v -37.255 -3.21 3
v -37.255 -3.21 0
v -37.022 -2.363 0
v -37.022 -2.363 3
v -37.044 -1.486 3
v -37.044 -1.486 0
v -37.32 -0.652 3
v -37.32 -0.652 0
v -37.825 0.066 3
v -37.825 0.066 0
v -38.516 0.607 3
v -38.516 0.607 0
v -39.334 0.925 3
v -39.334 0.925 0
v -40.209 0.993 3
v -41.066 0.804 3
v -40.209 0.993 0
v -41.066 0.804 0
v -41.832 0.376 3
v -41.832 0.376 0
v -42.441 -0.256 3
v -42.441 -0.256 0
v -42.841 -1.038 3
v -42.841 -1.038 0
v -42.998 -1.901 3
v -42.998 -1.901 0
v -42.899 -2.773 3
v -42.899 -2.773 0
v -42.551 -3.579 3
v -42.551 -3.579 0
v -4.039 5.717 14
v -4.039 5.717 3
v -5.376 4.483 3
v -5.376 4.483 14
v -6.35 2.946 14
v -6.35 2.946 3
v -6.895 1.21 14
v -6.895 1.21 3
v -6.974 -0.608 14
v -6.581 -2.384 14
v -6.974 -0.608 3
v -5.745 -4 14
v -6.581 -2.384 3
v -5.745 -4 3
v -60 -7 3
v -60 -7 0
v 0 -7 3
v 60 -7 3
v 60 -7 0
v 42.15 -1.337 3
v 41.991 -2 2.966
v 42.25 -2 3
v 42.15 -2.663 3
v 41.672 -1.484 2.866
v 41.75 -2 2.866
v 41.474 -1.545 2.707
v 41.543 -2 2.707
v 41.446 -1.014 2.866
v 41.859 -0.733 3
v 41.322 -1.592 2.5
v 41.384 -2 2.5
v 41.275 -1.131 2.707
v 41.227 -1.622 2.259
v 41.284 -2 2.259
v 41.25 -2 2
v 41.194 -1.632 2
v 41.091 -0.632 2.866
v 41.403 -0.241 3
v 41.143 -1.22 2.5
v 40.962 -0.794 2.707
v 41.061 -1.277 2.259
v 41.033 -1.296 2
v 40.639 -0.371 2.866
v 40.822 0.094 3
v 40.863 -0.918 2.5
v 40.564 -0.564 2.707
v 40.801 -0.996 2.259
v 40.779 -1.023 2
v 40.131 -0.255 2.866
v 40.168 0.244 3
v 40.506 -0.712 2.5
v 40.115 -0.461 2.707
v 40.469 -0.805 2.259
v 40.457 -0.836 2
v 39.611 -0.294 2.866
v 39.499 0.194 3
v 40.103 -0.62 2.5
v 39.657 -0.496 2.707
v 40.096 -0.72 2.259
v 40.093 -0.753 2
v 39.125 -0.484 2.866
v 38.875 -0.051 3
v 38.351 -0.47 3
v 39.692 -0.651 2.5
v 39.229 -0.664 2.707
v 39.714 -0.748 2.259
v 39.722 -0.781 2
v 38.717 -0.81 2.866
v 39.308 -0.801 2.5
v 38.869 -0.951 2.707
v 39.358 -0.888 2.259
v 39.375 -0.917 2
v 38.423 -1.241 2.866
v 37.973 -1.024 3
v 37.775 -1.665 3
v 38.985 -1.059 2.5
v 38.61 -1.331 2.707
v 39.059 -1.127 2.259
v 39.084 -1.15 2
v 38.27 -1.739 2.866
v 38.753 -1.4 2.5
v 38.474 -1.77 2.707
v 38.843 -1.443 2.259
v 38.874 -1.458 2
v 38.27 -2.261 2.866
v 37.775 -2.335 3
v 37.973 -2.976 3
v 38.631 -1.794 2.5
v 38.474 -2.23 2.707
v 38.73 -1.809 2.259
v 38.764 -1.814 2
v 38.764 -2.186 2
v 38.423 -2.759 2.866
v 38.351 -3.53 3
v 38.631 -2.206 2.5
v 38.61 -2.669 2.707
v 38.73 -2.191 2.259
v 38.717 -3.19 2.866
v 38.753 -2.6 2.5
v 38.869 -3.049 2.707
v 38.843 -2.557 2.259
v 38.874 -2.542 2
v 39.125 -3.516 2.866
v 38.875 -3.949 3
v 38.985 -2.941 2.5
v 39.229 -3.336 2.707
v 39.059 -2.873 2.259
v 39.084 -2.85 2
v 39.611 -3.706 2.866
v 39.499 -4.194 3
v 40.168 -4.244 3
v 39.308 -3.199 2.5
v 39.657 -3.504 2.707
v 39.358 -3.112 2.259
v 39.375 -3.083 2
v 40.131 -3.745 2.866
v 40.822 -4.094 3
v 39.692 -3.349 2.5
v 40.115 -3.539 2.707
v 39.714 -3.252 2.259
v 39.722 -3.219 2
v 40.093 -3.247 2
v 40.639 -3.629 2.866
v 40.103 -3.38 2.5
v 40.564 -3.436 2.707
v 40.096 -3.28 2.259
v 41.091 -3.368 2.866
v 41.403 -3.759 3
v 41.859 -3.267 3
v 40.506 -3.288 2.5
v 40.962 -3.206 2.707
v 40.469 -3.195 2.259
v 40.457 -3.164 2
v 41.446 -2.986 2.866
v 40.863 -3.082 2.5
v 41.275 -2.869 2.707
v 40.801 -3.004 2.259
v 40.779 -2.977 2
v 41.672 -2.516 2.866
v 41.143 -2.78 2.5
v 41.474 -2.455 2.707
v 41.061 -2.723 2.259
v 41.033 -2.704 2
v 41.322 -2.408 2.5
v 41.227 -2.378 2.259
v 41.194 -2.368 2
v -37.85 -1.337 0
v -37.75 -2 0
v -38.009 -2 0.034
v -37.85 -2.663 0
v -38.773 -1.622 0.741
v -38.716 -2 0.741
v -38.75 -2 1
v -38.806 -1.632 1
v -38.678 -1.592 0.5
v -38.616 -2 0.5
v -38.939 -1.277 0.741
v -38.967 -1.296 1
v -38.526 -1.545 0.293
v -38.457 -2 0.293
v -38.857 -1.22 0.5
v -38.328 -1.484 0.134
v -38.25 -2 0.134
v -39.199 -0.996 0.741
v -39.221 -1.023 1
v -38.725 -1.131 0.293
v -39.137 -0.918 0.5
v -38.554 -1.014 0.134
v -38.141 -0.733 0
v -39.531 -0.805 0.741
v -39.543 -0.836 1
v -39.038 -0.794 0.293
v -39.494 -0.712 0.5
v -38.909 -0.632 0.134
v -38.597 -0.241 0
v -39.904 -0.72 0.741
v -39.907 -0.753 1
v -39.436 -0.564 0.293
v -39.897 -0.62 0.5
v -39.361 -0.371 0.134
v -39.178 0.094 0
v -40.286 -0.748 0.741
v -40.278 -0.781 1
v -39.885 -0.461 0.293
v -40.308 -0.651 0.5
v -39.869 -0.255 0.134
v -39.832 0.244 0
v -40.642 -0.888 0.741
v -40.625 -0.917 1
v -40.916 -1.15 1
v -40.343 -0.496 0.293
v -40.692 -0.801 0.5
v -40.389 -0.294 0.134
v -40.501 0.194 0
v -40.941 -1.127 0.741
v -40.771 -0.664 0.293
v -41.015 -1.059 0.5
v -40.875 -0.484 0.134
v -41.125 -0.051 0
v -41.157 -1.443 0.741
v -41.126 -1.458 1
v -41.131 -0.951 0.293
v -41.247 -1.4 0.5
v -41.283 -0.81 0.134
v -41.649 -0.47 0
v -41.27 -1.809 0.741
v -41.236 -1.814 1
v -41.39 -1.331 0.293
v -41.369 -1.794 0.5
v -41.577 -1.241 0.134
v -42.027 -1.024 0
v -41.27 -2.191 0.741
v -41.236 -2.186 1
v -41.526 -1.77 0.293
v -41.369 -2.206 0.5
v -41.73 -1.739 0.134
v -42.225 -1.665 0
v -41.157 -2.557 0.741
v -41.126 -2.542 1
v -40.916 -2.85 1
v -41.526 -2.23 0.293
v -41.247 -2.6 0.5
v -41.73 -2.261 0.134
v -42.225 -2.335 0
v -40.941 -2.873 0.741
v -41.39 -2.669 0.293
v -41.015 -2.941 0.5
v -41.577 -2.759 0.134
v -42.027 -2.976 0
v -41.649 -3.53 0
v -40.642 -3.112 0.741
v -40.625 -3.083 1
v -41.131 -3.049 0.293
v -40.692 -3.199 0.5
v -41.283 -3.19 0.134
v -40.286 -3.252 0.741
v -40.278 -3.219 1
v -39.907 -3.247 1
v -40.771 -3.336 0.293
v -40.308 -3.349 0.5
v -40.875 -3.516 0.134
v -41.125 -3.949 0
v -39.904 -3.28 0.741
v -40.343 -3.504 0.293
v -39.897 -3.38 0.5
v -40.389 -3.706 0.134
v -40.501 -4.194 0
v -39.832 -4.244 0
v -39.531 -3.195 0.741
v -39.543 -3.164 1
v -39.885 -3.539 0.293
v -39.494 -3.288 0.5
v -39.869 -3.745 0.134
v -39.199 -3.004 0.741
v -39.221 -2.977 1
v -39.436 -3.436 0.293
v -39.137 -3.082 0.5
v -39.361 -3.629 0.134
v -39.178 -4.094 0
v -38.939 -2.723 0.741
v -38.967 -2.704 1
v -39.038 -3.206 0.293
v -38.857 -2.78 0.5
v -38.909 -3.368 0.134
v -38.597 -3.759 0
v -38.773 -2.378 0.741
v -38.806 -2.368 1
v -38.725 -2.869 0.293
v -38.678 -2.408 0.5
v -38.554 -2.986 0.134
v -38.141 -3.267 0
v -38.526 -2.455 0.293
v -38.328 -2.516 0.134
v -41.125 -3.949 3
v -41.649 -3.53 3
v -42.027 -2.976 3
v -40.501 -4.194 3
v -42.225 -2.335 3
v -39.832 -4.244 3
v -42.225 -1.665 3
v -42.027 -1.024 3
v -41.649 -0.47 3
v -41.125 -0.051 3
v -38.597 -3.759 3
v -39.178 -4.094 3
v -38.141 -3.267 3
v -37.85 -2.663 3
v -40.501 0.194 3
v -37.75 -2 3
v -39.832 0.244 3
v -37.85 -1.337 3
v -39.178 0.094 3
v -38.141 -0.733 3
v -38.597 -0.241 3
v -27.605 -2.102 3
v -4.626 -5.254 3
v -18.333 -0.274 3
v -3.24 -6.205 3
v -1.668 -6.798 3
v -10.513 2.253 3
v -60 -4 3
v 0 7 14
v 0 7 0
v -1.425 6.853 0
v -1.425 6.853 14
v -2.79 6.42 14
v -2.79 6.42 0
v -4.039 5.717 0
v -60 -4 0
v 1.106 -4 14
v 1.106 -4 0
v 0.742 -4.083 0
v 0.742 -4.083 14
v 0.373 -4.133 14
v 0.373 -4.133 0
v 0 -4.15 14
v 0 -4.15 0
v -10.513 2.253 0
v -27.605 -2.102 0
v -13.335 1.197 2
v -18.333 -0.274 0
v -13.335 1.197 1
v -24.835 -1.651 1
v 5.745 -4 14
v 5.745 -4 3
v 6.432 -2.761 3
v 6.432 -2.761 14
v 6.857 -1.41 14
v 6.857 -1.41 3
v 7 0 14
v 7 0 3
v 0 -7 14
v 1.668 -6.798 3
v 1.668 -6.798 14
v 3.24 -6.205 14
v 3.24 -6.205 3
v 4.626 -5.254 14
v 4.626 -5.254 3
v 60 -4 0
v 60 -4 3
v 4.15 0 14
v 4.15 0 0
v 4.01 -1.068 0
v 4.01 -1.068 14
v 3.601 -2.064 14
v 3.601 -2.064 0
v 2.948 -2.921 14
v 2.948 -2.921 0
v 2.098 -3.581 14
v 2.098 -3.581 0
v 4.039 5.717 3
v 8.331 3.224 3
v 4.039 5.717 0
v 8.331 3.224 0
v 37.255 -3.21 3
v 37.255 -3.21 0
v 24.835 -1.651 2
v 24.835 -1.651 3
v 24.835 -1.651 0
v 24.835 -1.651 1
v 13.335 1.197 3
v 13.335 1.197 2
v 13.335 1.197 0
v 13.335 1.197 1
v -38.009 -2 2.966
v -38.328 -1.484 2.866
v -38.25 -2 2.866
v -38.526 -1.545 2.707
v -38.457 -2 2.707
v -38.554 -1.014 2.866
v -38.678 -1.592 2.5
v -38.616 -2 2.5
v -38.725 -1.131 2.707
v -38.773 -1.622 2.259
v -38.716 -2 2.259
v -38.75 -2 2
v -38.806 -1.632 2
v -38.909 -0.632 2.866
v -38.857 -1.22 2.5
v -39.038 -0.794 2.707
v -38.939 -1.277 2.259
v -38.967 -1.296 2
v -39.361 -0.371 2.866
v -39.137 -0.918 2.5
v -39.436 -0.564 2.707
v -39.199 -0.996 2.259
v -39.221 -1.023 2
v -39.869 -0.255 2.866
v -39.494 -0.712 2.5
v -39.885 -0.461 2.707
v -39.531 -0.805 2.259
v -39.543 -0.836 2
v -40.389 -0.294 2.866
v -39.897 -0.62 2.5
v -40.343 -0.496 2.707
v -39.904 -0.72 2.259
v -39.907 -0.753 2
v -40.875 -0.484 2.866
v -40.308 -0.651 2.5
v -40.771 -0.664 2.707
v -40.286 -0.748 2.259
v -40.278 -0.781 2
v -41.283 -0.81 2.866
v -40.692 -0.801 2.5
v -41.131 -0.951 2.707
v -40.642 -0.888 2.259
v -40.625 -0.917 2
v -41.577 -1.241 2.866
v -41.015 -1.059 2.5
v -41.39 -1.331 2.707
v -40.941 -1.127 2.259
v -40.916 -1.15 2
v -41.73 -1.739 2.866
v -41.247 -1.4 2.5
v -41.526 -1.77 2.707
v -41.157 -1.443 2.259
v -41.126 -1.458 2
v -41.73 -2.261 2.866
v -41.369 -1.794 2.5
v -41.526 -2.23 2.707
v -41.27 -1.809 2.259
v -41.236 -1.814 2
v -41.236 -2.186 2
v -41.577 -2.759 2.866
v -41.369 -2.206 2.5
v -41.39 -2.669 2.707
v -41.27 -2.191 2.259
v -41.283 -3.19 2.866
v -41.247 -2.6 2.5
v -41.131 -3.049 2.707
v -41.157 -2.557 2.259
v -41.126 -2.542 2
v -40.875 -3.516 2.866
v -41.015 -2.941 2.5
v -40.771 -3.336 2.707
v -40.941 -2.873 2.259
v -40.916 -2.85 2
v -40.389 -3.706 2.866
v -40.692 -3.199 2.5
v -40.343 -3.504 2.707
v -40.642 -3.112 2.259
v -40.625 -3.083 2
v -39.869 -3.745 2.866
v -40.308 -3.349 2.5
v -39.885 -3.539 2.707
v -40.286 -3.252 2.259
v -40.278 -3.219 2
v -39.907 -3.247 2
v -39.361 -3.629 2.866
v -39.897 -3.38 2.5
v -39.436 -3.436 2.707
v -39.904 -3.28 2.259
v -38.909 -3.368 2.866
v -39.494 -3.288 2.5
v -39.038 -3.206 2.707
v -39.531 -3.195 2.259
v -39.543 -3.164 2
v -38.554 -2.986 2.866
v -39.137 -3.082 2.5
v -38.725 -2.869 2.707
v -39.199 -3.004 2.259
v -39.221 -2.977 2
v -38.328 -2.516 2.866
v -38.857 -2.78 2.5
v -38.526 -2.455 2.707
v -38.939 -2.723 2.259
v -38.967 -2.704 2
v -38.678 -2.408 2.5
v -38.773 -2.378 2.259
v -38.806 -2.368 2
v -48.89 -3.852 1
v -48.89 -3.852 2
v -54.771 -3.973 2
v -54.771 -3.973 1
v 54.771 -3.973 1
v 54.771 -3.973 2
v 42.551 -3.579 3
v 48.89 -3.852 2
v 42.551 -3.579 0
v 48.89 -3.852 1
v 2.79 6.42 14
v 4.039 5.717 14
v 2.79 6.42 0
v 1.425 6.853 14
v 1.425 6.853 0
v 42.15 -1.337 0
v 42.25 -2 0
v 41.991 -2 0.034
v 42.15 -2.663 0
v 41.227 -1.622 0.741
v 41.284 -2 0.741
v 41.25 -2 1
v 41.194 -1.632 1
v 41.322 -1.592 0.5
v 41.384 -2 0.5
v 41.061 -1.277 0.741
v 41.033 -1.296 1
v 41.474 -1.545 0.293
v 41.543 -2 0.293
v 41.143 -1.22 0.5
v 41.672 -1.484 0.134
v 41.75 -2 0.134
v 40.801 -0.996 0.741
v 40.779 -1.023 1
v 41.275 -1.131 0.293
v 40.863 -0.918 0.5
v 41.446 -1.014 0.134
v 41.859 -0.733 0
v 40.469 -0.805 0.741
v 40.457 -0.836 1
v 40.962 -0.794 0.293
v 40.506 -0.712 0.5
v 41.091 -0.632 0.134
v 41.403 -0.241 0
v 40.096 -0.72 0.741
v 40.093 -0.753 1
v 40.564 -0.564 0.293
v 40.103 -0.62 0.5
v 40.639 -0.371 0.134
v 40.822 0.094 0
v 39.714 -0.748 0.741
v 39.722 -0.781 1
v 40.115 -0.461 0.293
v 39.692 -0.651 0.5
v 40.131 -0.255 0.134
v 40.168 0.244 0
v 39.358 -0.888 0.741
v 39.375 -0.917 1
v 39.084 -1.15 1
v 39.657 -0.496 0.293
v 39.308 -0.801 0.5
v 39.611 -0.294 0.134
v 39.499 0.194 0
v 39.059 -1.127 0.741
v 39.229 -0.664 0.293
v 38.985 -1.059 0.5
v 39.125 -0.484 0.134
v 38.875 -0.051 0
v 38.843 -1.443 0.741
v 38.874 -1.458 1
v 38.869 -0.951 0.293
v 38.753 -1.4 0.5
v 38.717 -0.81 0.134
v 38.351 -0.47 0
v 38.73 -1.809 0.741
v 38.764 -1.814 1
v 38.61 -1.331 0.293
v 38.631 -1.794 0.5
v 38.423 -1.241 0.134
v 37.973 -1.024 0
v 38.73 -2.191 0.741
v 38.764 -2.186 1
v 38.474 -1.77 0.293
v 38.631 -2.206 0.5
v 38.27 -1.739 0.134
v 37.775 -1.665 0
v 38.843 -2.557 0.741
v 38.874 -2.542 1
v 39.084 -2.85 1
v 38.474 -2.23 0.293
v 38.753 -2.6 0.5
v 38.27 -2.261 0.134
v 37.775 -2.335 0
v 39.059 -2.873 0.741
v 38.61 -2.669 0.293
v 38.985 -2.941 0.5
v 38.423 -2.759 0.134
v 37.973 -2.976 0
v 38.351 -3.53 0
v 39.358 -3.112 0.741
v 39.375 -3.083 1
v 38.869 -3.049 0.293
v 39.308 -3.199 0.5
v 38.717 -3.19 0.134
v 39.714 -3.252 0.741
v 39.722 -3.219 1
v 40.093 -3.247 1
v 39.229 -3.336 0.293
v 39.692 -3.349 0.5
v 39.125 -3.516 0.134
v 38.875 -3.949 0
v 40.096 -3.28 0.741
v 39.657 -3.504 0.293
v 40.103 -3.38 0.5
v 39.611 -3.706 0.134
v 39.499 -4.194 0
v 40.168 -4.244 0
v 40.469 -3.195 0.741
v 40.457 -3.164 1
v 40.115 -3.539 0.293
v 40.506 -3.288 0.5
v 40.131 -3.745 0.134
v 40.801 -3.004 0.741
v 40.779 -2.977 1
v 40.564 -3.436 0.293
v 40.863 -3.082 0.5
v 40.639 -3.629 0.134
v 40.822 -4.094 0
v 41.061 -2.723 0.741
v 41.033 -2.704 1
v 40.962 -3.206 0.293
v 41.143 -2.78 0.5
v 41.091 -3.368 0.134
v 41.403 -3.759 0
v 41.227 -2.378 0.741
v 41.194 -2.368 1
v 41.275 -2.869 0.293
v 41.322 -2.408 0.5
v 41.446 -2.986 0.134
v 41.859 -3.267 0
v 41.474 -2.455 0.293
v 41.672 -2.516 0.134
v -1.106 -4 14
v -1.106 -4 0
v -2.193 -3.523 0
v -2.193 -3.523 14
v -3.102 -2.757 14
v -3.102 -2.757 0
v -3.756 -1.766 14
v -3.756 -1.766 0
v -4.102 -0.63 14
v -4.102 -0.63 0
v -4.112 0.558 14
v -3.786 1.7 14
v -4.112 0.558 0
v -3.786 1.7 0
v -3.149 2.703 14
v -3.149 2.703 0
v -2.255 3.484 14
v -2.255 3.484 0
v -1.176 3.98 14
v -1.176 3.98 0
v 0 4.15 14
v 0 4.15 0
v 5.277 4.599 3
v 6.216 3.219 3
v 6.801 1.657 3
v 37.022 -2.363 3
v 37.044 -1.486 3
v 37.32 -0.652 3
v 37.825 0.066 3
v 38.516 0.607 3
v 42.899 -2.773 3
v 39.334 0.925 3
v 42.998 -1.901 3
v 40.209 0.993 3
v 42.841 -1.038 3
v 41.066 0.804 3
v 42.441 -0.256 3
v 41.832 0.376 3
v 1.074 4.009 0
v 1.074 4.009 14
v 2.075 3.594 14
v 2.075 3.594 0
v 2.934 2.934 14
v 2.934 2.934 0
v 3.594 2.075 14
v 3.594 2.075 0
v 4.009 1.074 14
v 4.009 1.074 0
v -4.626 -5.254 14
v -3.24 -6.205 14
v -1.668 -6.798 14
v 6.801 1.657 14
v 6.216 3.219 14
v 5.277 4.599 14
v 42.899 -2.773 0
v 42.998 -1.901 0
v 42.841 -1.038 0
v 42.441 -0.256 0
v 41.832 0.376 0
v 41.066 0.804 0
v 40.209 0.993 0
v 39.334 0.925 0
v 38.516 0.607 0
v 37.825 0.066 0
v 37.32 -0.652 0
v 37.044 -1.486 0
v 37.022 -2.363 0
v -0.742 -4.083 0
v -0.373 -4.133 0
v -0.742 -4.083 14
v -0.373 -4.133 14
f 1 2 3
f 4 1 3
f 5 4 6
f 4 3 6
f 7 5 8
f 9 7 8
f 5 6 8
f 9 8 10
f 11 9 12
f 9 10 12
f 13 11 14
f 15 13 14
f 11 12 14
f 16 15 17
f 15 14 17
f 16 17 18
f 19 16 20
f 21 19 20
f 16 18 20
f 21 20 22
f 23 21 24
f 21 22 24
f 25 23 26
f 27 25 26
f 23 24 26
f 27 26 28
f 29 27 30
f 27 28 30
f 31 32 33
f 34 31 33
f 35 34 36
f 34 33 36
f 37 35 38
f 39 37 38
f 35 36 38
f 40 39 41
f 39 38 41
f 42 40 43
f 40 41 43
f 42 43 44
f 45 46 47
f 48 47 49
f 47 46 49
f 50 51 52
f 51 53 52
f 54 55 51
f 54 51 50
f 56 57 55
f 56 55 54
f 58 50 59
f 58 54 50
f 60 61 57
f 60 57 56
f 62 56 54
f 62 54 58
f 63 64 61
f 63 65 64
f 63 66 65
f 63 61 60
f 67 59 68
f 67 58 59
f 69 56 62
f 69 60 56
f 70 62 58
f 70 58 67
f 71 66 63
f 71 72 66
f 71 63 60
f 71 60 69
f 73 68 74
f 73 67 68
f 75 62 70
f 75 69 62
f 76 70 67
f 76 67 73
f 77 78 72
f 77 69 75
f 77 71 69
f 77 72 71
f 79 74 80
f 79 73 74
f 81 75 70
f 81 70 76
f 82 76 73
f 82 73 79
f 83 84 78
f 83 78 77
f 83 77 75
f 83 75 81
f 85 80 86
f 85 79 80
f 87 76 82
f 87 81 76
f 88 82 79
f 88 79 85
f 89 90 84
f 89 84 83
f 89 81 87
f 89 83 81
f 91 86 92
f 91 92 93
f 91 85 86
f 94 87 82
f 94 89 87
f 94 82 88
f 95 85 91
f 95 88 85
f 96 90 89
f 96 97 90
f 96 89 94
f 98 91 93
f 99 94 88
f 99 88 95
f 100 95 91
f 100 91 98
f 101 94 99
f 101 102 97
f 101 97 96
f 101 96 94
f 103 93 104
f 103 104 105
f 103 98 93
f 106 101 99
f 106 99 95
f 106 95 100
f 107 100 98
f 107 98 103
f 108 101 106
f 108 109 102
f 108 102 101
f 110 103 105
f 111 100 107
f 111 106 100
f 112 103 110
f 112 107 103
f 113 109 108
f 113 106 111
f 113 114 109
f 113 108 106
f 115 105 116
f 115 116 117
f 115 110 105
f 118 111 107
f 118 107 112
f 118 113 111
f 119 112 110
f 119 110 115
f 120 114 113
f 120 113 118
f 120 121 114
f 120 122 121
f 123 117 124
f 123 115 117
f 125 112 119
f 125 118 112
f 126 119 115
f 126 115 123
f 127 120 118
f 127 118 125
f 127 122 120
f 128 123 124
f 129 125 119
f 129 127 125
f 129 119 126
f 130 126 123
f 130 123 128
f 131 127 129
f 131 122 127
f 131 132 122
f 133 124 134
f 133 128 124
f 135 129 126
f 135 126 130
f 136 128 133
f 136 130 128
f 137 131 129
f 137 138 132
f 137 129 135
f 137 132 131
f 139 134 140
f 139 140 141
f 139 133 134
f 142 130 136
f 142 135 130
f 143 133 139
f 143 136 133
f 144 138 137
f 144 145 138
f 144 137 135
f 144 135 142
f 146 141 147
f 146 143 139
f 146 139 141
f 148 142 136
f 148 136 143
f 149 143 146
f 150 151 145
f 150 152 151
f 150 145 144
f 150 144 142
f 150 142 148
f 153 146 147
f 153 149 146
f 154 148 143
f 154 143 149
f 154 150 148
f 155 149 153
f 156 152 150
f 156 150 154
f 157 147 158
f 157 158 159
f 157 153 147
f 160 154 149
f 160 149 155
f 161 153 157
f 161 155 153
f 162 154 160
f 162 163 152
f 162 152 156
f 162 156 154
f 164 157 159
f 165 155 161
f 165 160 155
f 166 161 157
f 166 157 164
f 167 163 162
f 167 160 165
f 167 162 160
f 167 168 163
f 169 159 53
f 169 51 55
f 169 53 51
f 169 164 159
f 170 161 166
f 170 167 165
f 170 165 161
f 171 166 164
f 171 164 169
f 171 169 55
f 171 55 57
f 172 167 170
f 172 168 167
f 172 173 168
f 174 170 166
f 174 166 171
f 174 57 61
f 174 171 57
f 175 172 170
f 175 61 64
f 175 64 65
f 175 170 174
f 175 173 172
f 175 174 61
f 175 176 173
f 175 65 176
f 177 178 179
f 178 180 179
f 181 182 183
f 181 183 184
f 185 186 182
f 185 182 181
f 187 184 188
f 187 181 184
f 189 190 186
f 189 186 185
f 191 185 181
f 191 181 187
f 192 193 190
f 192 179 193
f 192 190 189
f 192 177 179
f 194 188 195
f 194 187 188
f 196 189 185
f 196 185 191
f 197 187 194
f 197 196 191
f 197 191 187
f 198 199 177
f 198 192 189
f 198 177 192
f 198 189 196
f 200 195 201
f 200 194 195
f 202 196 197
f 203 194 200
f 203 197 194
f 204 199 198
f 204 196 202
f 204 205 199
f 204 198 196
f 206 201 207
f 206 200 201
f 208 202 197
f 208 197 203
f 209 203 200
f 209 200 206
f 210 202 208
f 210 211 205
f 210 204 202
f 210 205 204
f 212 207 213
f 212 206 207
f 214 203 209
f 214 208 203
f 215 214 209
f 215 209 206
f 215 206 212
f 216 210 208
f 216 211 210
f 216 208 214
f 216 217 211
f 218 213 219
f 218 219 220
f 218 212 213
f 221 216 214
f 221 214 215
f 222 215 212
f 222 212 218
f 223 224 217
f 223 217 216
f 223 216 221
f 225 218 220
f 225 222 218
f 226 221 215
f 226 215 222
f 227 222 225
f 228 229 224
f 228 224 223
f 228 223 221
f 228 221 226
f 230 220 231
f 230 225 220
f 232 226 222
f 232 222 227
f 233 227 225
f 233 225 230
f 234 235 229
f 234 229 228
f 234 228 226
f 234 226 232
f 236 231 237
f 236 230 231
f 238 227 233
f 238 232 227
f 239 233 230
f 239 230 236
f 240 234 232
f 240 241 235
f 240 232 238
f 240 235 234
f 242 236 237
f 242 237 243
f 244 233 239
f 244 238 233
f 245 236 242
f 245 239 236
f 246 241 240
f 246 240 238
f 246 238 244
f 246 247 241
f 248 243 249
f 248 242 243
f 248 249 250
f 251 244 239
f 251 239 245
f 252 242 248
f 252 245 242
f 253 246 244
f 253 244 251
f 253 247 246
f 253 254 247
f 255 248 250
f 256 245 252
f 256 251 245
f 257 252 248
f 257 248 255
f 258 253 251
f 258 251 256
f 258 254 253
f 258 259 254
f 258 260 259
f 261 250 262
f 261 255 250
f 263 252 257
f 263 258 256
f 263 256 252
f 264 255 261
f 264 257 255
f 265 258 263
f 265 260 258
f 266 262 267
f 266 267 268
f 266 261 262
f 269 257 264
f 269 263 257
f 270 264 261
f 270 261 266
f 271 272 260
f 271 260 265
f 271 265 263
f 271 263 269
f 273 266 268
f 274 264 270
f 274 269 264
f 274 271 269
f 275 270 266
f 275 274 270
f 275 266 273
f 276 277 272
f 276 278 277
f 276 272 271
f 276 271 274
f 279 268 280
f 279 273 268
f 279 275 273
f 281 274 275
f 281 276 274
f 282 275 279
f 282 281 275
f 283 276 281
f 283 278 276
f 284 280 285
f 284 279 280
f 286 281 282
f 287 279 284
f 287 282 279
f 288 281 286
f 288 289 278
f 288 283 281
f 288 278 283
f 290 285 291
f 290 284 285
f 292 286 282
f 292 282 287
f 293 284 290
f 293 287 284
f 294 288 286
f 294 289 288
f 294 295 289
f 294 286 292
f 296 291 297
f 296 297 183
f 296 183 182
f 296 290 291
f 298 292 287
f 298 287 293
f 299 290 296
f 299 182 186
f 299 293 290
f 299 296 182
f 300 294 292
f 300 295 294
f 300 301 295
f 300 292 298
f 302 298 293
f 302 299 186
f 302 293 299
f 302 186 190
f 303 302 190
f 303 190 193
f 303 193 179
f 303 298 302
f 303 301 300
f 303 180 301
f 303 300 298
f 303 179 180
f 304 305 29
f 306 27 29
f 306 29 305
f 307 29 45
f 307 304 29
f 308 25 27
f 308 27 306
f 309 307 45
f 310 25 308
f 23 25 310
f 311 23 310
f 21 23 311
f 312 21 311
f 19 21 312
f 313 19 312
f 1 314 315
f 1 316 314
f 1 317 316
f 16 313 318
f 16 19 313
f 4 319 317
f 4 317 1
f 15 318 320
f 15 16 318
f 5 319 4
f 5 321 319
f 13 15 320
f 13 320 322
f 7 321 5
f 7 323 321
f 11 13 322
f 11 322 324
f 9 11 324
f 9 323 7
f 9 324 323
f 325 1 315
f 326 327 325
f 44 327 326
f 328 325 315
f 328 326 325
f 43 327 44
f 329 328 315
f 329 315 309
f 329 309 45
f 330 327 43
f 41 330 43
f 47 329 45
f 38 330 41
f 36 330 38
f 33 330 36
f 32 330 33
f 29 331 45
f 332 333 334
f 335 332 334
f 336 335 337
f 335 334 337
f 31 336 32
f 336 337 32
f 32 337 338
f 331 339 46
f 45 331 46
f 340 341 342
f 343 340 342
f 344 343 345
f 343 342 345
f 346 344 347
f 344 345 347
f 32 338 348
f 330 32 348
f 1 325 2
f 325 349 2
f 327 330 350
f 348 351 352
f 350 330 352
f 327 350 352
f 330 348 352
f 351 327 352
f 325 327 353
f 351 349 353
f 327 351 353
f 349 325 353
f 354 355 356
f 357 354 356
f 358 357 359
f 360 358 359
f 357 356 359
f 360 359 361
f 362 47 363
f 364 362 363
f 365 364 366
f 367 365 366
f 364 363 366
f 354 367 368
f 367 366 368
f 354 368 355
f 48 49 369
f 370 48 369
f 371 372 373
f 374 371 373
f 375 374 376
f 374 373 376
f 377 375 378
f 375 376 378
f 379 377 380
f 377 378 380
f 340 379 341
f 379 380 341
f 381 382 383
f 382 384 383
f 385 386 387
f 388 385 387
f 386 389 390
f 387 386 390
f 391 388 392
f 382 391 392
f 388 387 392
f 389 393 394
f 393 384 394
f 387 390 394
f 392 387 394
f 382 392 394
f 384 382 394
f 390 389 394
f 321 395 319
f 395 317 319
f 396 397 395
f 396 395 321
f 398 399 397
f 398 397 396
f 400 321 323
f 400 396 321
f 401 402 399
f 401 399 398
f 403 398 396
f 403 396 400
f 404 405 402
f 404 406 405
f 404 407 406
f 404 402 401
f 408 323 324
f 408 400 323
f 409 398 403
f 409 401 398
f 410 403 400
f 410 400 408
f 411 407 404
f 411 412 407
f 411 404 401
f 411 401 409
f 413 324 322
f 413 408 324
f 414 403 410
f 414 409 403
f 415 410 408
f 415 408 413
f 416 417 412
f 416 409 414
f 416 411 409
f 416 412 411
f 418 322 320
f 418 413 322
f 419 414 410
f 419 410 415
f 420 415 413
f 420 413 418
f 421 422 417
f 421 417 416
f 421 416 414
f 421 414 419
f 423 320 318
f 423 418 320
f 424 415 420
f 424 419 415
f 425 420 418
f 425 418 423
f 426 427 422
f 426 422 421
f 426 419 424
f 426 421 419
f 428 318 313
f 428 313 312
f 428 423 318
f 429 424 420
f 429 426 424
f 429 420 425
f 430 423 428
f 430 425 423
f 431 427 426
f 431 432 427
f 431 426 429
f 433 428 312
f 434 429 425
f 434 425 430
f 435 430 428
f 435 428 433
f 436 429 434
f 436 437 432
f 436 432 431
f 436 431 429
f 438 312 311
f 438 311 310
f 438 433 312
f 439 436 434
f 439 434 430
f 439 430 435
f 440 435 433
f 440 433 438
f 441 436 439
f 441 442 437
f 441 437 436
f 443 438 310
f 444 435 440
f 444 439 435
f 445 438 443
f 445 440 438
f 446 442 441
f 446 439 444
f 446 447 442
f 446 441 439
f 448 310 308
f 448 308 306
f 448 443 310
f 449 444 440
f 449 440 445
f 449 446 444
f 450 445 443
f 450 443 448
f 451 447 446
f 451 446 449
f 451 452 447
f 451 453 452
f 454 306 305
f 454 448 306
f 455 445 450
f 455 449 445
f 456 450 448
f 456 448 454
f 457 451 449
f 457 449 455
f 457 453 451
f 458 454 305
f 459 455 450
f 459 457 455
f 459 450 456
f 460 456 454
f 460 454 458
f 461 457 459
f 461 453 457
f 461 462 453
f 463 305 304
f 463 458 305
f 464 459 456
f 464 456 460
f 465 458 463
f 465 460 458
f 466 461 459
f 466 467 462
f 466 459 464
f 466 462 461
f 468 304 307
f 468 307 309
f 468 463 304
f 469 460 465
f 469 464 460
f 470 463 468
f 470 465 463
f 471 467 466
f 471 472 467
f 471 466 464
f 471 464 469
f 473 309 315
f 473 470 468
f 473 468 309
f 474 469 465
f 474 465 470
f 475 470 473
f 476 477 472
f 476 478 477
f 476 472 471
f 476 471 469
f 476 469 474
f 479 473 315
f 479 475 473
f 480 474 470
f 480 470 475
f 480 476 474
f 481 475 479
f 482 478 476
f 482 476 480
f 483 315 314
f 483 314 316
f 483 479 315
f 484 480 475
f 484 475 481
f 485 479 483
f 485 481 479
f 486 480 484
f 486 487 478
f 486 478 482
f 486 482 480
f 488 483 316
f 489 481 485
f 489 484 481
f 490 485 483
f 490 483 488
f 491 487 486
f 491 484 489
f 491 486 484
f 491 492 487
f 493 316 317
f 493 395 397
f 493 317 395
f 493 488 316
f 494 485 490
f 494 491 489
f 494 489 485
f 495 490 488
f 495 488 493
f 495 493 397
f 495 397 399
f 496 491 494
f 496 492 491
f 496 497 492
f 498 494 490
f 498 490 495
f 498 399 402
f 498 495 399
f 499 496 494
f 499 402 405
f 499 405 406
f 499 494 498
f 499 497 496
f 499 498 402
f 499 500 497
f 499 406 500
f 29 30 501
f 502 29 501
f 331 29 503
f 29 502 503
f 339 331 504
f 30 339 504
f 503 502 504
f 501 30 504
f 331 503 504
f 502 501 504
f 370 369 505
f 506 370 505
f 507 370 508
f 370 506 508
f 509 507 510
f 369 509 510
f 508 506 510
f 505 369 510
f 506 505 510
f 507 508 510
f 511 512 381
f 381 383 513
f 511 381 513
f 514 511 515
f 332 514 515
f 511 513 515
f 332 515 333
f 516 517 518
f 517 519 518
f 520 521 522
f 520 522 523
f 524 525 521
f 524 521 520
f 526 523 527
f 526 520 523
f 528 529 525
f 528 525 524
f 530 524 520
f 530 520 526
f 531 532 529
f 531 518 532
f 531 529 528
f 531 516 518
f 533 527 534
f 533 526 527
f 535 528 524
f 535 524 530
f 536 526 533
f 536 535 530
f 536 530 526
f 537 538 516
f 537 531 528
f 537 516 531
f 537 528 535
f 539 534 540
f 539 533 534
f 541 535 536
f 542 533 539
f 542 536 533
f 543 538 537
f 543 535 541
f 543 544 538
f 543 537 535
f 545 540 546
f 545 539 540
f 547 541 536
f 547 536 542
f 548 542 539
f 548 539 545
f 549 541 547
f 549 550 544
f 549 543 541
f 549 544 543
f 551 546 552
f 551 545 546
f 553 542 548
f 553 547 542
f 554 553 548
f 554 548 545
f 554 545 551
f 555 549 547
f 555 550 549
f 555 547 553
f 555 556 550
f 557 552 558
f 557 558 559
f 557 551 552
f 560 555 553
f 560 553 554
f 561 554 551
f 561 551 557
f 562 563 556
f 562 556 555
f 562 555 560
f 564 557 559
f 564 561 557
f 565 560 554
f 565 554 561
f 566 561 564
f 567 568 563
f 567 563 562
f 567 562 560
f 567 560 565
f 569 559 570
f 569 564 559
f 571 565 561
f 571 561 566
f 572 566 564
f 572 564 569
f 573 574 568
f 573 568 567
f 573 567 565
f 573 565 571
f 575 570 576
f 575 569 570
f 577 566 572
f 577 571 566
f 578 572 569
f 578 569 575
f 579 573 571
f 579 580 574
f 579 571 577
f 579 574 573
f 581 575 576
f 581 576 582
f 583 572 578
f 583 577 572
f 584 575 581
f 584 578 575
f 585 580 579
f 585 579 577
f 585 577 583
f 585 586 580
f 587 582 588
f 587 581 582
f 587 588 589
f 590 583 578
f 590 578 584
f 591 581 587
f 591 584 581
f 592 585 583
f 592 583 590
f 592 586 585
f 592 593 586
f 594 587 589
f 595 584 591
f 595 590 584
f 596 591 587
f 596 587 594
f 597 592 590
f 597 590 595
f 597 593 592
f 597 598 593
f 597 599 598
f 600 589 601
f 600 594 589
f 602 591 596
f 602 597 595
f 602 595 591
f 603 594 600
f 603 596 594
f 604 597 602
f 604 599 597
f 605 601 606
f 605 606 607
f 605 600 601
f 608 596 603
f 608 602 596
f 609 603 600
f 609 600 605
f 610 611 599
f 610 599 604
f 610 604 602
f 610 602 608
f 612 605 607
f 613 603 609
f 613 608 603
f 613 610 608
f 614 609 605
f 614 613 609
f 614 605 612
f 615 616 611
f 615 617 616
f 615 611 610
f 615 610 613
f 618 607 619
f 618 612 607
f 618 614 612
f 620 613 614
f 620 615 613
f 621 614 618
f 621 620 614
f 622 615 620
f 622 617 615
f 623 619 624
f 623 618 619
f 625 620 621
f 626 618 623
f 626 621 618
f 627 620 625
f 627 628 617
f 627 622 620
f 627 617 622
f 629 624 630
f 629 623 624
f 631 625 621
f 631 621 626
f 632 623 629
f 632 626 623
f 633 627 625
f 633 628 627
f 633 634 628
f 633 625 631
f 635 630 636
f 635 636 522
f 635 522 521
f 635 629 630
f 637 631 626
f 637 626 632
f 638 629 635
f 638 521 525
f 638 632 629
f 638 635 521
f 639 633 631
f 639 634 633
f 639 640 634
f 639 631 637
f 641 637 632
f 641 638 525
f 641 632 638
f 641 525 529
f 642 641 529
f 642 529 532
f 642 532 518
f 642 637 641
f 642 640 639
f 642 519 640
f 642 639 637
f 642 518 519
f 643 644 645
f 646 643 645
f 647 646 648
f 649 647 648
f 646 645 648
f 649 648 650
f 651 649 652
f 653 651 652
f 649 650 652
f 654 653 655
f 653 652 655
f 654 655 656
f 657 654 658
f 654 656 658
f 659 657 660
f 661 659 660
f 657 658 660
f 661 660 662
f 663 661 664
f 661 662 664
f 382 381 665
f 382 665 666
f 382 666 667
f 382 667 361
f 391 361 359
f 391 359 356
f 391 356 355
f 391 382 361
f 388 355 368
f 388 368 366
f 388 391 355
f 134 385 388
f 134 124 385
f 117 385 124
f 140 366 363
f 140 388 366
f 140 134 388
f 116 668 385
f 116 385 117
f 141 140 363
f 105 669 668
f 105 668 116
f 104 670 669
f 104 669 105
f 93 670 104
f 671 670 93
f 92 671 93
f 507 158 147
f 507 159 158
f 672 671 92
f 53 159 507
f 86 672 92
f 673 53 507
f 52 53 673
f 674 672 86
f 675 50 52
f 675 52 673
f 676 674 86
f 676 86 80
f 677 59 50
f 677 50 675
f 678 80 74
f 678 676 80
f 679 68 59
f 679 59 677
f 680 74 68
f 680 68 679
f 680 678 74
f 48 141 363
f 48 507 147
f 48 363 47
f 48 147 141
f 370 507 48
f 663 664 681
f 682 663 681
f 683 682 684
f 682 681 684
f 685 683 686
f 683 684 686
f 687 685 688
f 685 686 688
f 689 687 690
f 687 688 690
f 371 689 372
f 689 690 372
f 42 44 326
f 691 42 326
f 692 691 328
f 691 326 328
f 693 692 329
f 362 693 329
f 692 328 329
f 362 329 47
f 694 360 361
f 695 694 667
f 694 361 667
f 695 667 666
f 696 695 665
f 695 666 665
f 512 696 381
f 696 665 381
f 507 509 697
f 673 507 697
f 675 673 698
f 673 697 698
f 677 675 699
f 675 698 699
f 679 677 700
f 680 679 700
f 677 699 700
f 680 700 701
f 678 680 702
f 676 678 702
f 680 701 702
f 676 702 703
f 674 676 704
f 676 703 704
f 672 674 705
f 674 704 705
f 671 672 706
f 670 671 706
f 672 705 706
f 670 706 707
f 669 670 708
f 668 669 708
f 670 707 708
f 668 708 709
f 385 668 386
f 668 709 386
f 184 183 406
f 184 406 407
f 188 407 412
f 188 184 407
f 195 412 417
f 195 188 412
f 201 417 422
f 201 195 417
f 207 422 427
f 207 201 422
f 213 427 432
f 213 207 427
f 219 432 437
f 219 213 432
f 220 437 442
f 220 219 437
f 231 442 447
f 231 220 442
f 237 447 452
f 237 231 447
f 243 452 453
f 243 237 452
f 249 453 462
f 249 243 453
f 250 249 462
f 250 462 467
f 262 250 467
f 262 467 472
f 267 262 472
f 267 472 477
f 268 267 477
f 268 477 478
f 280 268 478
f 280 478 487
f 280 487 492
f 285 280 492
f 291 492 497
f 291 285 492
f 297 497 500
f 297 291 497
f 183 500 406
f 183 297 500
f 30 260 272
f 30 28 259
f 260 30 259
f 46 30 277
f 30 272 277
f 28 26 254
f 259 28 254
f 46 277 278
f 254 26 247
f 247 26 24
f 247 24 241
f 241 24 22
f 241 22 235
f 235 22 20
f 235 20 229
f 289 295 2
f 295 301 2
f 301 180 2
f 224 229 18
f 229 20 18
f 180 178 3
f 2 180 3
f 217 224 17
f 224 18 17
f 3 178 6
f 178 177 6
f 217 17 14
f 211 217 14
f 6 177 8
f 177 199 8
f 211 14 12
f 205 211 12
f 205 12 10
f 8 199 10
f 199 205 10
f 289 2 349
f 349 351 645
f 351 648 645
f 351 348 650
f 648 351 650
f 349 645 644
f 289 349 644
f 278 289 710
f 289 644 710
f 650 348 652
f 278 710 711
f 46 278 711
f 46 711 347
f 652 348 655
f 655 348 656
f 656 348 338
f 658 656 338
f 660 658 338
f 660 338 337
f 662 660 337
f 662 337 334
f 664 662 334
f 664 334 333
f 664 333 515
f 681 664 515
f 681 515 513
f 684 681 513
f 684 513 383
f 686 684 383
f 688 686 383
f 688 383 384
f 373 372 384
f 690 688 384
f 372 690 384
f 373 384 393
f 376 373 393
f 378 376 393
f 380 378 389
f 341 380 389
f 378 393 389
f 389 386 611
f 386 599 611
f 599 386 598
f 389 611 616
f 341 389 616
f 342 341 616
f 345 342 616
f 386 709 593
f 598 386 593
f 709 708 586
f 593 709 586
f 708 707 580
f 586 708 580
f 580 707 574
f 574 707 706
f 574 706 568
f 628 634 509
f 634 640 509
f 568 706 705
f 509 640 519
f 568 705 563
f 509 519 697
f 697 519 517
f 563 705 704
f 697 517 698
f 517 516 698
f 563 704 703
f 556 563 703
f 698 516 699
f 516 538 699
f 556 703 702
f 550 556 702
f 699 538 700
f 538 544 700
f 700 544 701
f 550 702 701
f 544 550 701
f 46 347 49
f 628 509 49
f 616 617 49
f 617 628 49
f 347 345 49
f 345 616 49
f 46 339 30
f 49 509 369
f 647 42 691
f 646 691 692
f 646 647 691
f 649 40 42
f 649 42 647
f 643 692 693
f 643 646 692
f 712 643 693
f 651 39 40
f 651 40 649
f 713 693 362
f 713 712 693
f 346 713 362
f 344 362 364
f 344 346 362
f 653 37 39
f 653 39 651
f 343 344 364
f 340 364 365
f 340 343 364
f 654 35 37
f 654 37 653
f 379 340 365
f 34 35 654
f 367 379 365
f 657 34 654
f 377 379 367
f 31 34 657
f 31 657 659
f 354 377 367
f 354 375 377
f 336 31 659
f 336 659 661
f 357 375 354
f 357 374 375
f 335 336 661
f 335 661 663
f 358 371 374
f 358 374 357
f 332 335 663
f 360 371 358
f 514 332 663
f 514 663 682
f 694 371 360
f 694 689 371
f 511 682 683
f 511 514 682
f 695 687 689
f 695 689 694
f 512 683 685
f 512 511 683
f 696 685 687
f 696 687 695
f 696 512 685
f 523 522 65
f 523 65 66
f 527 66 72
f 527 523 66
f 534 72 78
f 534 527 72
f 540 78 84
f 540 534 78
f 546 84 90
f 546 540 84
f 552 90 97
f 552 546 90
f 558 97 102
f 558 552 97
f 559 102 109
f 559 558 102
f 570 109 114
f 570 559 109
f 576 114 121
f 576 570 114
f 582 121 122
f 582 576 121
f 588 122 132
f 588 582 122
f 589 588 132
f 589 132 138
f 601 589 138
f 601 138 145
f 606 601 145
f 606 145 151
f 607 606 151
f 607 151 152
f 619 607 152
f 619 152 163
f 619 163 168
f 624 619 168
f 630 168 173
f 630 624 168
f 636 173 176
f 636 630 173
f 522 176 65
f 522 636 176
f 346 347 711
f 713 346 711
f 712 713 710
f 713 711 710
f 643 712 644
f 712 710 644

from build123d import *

# Parameters (mm, degrees)
SKETCH1_R             = 1.25
BOSS_EXTRUDE1_DEPTH   = 3
BOSS_EXTRUDE1_2_DEPTH = 3
SKETCH1_3_R           = 7
SKETCH1_3_R_2         = 4.15
BOSS_EXTRUDE2_DEPTH   = 14
FILLET1_R             = 1


with BuildPart() as part:
    # Sketch1 → Boss-Extrude1 (new body)
    with BuildSketch(Plane.XY):
        with BuildLine():
            Line((0, -7), (60, -7))
            Line((60, -7), (60, -4))
            add(Edge.make_bspline(
                [(60, -4), (55.163320485, -4), (49.053298786, -3.947636788), (42.55073288, -3.579164898)],
                knots=[0, 0, 0, 0, 0.318433517, 0.318433517, 0.318433517, 0.318433517], degree=3))
            ThreePointArc((42.55073288, -3.579164898), (40.208782774, 0.992726141), (37.254706676, -3.209696062))
            add(Edge.make_bspline(
                [(37.254706676, -3.209696062), (24.804076794, -2.167051335), (11.80488785, 0.231594042), (4.038655229, 5.717452574)],
                knots=[0.403779051, 0.403779051, 0.403779051, 0.403779051, 1, 1, 1, 1], degree=3))
            ThreePointArc((4.038655229, 5.717452574), (6.671662762, -2.118706207), (0, -7))
        make_face()
        with Locations((40, -2)):
            Circle(SKETCH1_R, mode=Mode.SUBTRACT)
    extrude(amount=BOSS_EXTRUDE1_DEPTH)



with BuildPart() as body_2:
    # Sketch1 → Boss-Extrude1 2 (new body)
    with BuildSketch(Plane.XY):
        with BuildLine():
            Line((-60, -7), (0, -7))
            ThreePointArc((0, -7), (-6.671662763, -2.118706204), (-4.038655225, 5.717452578))
            add(Edge.make_bspline(
                [(-37.254706671, -3.209696052), (-24.804076837, -2.16705132), (-11.80488784, 0.231594059), (-4.038655225, 5.717452578)],
                knots=[0.403779054, 0.403779054, 0.403779054, 0.403779054, 1, 1, 1, 1], degree=3))
            ThreePointArc((-37.254706671, -3.209696052), (-40.208782776, 0.992726141), (-42.550732884, -3.579164892))
            add(Edge.make_bspline(
                [(-60, -4), (-55.163320586, -4), (-49.053298864, -3.94763679), (-42.550732884, -3.579164892)],
                knots=[0, 0, 0, 0, 0.31843352, 0.31843352, 0.31843352, 0.31843352], degree=3))
            Line((-60, -4), (-60, -7))
        make_face()
        with Locations((-40, -2)):
            Circle(SKETCH1_R, mode=Mode.SUBTRACT)
    extrude(amount=BOSS_EXTRUDE1_2_DEPTH)


with BuildPart() as part_1:
    add(part.part)

    add(body_2.part)  # Boss-Extrude2 merges body 2
    # Sketch1<3> → Boss-Extrude2 (add)
    with BuildSketch(Plane.XY):
        Circle(SKETCH1_3_R)
        Circle(SKETCH1_3_R_2, mode=Mode.SUBTRACT)
    extrude(amount=BOSS_EXTRUDE2_DEPTH)

    # Fillet1
    fillet1_edges = [part_1.edges().sort_by_distance(p)[0] for p in [
        (38.75, -2, 3),
        (38.75, -2, 0),
        (-41.25, -2, 0),
        (-41.25, -2, 3),
    ]]
    fillet(fillet1_edges, radius=FILLET1_R)


solid = part_1.part
